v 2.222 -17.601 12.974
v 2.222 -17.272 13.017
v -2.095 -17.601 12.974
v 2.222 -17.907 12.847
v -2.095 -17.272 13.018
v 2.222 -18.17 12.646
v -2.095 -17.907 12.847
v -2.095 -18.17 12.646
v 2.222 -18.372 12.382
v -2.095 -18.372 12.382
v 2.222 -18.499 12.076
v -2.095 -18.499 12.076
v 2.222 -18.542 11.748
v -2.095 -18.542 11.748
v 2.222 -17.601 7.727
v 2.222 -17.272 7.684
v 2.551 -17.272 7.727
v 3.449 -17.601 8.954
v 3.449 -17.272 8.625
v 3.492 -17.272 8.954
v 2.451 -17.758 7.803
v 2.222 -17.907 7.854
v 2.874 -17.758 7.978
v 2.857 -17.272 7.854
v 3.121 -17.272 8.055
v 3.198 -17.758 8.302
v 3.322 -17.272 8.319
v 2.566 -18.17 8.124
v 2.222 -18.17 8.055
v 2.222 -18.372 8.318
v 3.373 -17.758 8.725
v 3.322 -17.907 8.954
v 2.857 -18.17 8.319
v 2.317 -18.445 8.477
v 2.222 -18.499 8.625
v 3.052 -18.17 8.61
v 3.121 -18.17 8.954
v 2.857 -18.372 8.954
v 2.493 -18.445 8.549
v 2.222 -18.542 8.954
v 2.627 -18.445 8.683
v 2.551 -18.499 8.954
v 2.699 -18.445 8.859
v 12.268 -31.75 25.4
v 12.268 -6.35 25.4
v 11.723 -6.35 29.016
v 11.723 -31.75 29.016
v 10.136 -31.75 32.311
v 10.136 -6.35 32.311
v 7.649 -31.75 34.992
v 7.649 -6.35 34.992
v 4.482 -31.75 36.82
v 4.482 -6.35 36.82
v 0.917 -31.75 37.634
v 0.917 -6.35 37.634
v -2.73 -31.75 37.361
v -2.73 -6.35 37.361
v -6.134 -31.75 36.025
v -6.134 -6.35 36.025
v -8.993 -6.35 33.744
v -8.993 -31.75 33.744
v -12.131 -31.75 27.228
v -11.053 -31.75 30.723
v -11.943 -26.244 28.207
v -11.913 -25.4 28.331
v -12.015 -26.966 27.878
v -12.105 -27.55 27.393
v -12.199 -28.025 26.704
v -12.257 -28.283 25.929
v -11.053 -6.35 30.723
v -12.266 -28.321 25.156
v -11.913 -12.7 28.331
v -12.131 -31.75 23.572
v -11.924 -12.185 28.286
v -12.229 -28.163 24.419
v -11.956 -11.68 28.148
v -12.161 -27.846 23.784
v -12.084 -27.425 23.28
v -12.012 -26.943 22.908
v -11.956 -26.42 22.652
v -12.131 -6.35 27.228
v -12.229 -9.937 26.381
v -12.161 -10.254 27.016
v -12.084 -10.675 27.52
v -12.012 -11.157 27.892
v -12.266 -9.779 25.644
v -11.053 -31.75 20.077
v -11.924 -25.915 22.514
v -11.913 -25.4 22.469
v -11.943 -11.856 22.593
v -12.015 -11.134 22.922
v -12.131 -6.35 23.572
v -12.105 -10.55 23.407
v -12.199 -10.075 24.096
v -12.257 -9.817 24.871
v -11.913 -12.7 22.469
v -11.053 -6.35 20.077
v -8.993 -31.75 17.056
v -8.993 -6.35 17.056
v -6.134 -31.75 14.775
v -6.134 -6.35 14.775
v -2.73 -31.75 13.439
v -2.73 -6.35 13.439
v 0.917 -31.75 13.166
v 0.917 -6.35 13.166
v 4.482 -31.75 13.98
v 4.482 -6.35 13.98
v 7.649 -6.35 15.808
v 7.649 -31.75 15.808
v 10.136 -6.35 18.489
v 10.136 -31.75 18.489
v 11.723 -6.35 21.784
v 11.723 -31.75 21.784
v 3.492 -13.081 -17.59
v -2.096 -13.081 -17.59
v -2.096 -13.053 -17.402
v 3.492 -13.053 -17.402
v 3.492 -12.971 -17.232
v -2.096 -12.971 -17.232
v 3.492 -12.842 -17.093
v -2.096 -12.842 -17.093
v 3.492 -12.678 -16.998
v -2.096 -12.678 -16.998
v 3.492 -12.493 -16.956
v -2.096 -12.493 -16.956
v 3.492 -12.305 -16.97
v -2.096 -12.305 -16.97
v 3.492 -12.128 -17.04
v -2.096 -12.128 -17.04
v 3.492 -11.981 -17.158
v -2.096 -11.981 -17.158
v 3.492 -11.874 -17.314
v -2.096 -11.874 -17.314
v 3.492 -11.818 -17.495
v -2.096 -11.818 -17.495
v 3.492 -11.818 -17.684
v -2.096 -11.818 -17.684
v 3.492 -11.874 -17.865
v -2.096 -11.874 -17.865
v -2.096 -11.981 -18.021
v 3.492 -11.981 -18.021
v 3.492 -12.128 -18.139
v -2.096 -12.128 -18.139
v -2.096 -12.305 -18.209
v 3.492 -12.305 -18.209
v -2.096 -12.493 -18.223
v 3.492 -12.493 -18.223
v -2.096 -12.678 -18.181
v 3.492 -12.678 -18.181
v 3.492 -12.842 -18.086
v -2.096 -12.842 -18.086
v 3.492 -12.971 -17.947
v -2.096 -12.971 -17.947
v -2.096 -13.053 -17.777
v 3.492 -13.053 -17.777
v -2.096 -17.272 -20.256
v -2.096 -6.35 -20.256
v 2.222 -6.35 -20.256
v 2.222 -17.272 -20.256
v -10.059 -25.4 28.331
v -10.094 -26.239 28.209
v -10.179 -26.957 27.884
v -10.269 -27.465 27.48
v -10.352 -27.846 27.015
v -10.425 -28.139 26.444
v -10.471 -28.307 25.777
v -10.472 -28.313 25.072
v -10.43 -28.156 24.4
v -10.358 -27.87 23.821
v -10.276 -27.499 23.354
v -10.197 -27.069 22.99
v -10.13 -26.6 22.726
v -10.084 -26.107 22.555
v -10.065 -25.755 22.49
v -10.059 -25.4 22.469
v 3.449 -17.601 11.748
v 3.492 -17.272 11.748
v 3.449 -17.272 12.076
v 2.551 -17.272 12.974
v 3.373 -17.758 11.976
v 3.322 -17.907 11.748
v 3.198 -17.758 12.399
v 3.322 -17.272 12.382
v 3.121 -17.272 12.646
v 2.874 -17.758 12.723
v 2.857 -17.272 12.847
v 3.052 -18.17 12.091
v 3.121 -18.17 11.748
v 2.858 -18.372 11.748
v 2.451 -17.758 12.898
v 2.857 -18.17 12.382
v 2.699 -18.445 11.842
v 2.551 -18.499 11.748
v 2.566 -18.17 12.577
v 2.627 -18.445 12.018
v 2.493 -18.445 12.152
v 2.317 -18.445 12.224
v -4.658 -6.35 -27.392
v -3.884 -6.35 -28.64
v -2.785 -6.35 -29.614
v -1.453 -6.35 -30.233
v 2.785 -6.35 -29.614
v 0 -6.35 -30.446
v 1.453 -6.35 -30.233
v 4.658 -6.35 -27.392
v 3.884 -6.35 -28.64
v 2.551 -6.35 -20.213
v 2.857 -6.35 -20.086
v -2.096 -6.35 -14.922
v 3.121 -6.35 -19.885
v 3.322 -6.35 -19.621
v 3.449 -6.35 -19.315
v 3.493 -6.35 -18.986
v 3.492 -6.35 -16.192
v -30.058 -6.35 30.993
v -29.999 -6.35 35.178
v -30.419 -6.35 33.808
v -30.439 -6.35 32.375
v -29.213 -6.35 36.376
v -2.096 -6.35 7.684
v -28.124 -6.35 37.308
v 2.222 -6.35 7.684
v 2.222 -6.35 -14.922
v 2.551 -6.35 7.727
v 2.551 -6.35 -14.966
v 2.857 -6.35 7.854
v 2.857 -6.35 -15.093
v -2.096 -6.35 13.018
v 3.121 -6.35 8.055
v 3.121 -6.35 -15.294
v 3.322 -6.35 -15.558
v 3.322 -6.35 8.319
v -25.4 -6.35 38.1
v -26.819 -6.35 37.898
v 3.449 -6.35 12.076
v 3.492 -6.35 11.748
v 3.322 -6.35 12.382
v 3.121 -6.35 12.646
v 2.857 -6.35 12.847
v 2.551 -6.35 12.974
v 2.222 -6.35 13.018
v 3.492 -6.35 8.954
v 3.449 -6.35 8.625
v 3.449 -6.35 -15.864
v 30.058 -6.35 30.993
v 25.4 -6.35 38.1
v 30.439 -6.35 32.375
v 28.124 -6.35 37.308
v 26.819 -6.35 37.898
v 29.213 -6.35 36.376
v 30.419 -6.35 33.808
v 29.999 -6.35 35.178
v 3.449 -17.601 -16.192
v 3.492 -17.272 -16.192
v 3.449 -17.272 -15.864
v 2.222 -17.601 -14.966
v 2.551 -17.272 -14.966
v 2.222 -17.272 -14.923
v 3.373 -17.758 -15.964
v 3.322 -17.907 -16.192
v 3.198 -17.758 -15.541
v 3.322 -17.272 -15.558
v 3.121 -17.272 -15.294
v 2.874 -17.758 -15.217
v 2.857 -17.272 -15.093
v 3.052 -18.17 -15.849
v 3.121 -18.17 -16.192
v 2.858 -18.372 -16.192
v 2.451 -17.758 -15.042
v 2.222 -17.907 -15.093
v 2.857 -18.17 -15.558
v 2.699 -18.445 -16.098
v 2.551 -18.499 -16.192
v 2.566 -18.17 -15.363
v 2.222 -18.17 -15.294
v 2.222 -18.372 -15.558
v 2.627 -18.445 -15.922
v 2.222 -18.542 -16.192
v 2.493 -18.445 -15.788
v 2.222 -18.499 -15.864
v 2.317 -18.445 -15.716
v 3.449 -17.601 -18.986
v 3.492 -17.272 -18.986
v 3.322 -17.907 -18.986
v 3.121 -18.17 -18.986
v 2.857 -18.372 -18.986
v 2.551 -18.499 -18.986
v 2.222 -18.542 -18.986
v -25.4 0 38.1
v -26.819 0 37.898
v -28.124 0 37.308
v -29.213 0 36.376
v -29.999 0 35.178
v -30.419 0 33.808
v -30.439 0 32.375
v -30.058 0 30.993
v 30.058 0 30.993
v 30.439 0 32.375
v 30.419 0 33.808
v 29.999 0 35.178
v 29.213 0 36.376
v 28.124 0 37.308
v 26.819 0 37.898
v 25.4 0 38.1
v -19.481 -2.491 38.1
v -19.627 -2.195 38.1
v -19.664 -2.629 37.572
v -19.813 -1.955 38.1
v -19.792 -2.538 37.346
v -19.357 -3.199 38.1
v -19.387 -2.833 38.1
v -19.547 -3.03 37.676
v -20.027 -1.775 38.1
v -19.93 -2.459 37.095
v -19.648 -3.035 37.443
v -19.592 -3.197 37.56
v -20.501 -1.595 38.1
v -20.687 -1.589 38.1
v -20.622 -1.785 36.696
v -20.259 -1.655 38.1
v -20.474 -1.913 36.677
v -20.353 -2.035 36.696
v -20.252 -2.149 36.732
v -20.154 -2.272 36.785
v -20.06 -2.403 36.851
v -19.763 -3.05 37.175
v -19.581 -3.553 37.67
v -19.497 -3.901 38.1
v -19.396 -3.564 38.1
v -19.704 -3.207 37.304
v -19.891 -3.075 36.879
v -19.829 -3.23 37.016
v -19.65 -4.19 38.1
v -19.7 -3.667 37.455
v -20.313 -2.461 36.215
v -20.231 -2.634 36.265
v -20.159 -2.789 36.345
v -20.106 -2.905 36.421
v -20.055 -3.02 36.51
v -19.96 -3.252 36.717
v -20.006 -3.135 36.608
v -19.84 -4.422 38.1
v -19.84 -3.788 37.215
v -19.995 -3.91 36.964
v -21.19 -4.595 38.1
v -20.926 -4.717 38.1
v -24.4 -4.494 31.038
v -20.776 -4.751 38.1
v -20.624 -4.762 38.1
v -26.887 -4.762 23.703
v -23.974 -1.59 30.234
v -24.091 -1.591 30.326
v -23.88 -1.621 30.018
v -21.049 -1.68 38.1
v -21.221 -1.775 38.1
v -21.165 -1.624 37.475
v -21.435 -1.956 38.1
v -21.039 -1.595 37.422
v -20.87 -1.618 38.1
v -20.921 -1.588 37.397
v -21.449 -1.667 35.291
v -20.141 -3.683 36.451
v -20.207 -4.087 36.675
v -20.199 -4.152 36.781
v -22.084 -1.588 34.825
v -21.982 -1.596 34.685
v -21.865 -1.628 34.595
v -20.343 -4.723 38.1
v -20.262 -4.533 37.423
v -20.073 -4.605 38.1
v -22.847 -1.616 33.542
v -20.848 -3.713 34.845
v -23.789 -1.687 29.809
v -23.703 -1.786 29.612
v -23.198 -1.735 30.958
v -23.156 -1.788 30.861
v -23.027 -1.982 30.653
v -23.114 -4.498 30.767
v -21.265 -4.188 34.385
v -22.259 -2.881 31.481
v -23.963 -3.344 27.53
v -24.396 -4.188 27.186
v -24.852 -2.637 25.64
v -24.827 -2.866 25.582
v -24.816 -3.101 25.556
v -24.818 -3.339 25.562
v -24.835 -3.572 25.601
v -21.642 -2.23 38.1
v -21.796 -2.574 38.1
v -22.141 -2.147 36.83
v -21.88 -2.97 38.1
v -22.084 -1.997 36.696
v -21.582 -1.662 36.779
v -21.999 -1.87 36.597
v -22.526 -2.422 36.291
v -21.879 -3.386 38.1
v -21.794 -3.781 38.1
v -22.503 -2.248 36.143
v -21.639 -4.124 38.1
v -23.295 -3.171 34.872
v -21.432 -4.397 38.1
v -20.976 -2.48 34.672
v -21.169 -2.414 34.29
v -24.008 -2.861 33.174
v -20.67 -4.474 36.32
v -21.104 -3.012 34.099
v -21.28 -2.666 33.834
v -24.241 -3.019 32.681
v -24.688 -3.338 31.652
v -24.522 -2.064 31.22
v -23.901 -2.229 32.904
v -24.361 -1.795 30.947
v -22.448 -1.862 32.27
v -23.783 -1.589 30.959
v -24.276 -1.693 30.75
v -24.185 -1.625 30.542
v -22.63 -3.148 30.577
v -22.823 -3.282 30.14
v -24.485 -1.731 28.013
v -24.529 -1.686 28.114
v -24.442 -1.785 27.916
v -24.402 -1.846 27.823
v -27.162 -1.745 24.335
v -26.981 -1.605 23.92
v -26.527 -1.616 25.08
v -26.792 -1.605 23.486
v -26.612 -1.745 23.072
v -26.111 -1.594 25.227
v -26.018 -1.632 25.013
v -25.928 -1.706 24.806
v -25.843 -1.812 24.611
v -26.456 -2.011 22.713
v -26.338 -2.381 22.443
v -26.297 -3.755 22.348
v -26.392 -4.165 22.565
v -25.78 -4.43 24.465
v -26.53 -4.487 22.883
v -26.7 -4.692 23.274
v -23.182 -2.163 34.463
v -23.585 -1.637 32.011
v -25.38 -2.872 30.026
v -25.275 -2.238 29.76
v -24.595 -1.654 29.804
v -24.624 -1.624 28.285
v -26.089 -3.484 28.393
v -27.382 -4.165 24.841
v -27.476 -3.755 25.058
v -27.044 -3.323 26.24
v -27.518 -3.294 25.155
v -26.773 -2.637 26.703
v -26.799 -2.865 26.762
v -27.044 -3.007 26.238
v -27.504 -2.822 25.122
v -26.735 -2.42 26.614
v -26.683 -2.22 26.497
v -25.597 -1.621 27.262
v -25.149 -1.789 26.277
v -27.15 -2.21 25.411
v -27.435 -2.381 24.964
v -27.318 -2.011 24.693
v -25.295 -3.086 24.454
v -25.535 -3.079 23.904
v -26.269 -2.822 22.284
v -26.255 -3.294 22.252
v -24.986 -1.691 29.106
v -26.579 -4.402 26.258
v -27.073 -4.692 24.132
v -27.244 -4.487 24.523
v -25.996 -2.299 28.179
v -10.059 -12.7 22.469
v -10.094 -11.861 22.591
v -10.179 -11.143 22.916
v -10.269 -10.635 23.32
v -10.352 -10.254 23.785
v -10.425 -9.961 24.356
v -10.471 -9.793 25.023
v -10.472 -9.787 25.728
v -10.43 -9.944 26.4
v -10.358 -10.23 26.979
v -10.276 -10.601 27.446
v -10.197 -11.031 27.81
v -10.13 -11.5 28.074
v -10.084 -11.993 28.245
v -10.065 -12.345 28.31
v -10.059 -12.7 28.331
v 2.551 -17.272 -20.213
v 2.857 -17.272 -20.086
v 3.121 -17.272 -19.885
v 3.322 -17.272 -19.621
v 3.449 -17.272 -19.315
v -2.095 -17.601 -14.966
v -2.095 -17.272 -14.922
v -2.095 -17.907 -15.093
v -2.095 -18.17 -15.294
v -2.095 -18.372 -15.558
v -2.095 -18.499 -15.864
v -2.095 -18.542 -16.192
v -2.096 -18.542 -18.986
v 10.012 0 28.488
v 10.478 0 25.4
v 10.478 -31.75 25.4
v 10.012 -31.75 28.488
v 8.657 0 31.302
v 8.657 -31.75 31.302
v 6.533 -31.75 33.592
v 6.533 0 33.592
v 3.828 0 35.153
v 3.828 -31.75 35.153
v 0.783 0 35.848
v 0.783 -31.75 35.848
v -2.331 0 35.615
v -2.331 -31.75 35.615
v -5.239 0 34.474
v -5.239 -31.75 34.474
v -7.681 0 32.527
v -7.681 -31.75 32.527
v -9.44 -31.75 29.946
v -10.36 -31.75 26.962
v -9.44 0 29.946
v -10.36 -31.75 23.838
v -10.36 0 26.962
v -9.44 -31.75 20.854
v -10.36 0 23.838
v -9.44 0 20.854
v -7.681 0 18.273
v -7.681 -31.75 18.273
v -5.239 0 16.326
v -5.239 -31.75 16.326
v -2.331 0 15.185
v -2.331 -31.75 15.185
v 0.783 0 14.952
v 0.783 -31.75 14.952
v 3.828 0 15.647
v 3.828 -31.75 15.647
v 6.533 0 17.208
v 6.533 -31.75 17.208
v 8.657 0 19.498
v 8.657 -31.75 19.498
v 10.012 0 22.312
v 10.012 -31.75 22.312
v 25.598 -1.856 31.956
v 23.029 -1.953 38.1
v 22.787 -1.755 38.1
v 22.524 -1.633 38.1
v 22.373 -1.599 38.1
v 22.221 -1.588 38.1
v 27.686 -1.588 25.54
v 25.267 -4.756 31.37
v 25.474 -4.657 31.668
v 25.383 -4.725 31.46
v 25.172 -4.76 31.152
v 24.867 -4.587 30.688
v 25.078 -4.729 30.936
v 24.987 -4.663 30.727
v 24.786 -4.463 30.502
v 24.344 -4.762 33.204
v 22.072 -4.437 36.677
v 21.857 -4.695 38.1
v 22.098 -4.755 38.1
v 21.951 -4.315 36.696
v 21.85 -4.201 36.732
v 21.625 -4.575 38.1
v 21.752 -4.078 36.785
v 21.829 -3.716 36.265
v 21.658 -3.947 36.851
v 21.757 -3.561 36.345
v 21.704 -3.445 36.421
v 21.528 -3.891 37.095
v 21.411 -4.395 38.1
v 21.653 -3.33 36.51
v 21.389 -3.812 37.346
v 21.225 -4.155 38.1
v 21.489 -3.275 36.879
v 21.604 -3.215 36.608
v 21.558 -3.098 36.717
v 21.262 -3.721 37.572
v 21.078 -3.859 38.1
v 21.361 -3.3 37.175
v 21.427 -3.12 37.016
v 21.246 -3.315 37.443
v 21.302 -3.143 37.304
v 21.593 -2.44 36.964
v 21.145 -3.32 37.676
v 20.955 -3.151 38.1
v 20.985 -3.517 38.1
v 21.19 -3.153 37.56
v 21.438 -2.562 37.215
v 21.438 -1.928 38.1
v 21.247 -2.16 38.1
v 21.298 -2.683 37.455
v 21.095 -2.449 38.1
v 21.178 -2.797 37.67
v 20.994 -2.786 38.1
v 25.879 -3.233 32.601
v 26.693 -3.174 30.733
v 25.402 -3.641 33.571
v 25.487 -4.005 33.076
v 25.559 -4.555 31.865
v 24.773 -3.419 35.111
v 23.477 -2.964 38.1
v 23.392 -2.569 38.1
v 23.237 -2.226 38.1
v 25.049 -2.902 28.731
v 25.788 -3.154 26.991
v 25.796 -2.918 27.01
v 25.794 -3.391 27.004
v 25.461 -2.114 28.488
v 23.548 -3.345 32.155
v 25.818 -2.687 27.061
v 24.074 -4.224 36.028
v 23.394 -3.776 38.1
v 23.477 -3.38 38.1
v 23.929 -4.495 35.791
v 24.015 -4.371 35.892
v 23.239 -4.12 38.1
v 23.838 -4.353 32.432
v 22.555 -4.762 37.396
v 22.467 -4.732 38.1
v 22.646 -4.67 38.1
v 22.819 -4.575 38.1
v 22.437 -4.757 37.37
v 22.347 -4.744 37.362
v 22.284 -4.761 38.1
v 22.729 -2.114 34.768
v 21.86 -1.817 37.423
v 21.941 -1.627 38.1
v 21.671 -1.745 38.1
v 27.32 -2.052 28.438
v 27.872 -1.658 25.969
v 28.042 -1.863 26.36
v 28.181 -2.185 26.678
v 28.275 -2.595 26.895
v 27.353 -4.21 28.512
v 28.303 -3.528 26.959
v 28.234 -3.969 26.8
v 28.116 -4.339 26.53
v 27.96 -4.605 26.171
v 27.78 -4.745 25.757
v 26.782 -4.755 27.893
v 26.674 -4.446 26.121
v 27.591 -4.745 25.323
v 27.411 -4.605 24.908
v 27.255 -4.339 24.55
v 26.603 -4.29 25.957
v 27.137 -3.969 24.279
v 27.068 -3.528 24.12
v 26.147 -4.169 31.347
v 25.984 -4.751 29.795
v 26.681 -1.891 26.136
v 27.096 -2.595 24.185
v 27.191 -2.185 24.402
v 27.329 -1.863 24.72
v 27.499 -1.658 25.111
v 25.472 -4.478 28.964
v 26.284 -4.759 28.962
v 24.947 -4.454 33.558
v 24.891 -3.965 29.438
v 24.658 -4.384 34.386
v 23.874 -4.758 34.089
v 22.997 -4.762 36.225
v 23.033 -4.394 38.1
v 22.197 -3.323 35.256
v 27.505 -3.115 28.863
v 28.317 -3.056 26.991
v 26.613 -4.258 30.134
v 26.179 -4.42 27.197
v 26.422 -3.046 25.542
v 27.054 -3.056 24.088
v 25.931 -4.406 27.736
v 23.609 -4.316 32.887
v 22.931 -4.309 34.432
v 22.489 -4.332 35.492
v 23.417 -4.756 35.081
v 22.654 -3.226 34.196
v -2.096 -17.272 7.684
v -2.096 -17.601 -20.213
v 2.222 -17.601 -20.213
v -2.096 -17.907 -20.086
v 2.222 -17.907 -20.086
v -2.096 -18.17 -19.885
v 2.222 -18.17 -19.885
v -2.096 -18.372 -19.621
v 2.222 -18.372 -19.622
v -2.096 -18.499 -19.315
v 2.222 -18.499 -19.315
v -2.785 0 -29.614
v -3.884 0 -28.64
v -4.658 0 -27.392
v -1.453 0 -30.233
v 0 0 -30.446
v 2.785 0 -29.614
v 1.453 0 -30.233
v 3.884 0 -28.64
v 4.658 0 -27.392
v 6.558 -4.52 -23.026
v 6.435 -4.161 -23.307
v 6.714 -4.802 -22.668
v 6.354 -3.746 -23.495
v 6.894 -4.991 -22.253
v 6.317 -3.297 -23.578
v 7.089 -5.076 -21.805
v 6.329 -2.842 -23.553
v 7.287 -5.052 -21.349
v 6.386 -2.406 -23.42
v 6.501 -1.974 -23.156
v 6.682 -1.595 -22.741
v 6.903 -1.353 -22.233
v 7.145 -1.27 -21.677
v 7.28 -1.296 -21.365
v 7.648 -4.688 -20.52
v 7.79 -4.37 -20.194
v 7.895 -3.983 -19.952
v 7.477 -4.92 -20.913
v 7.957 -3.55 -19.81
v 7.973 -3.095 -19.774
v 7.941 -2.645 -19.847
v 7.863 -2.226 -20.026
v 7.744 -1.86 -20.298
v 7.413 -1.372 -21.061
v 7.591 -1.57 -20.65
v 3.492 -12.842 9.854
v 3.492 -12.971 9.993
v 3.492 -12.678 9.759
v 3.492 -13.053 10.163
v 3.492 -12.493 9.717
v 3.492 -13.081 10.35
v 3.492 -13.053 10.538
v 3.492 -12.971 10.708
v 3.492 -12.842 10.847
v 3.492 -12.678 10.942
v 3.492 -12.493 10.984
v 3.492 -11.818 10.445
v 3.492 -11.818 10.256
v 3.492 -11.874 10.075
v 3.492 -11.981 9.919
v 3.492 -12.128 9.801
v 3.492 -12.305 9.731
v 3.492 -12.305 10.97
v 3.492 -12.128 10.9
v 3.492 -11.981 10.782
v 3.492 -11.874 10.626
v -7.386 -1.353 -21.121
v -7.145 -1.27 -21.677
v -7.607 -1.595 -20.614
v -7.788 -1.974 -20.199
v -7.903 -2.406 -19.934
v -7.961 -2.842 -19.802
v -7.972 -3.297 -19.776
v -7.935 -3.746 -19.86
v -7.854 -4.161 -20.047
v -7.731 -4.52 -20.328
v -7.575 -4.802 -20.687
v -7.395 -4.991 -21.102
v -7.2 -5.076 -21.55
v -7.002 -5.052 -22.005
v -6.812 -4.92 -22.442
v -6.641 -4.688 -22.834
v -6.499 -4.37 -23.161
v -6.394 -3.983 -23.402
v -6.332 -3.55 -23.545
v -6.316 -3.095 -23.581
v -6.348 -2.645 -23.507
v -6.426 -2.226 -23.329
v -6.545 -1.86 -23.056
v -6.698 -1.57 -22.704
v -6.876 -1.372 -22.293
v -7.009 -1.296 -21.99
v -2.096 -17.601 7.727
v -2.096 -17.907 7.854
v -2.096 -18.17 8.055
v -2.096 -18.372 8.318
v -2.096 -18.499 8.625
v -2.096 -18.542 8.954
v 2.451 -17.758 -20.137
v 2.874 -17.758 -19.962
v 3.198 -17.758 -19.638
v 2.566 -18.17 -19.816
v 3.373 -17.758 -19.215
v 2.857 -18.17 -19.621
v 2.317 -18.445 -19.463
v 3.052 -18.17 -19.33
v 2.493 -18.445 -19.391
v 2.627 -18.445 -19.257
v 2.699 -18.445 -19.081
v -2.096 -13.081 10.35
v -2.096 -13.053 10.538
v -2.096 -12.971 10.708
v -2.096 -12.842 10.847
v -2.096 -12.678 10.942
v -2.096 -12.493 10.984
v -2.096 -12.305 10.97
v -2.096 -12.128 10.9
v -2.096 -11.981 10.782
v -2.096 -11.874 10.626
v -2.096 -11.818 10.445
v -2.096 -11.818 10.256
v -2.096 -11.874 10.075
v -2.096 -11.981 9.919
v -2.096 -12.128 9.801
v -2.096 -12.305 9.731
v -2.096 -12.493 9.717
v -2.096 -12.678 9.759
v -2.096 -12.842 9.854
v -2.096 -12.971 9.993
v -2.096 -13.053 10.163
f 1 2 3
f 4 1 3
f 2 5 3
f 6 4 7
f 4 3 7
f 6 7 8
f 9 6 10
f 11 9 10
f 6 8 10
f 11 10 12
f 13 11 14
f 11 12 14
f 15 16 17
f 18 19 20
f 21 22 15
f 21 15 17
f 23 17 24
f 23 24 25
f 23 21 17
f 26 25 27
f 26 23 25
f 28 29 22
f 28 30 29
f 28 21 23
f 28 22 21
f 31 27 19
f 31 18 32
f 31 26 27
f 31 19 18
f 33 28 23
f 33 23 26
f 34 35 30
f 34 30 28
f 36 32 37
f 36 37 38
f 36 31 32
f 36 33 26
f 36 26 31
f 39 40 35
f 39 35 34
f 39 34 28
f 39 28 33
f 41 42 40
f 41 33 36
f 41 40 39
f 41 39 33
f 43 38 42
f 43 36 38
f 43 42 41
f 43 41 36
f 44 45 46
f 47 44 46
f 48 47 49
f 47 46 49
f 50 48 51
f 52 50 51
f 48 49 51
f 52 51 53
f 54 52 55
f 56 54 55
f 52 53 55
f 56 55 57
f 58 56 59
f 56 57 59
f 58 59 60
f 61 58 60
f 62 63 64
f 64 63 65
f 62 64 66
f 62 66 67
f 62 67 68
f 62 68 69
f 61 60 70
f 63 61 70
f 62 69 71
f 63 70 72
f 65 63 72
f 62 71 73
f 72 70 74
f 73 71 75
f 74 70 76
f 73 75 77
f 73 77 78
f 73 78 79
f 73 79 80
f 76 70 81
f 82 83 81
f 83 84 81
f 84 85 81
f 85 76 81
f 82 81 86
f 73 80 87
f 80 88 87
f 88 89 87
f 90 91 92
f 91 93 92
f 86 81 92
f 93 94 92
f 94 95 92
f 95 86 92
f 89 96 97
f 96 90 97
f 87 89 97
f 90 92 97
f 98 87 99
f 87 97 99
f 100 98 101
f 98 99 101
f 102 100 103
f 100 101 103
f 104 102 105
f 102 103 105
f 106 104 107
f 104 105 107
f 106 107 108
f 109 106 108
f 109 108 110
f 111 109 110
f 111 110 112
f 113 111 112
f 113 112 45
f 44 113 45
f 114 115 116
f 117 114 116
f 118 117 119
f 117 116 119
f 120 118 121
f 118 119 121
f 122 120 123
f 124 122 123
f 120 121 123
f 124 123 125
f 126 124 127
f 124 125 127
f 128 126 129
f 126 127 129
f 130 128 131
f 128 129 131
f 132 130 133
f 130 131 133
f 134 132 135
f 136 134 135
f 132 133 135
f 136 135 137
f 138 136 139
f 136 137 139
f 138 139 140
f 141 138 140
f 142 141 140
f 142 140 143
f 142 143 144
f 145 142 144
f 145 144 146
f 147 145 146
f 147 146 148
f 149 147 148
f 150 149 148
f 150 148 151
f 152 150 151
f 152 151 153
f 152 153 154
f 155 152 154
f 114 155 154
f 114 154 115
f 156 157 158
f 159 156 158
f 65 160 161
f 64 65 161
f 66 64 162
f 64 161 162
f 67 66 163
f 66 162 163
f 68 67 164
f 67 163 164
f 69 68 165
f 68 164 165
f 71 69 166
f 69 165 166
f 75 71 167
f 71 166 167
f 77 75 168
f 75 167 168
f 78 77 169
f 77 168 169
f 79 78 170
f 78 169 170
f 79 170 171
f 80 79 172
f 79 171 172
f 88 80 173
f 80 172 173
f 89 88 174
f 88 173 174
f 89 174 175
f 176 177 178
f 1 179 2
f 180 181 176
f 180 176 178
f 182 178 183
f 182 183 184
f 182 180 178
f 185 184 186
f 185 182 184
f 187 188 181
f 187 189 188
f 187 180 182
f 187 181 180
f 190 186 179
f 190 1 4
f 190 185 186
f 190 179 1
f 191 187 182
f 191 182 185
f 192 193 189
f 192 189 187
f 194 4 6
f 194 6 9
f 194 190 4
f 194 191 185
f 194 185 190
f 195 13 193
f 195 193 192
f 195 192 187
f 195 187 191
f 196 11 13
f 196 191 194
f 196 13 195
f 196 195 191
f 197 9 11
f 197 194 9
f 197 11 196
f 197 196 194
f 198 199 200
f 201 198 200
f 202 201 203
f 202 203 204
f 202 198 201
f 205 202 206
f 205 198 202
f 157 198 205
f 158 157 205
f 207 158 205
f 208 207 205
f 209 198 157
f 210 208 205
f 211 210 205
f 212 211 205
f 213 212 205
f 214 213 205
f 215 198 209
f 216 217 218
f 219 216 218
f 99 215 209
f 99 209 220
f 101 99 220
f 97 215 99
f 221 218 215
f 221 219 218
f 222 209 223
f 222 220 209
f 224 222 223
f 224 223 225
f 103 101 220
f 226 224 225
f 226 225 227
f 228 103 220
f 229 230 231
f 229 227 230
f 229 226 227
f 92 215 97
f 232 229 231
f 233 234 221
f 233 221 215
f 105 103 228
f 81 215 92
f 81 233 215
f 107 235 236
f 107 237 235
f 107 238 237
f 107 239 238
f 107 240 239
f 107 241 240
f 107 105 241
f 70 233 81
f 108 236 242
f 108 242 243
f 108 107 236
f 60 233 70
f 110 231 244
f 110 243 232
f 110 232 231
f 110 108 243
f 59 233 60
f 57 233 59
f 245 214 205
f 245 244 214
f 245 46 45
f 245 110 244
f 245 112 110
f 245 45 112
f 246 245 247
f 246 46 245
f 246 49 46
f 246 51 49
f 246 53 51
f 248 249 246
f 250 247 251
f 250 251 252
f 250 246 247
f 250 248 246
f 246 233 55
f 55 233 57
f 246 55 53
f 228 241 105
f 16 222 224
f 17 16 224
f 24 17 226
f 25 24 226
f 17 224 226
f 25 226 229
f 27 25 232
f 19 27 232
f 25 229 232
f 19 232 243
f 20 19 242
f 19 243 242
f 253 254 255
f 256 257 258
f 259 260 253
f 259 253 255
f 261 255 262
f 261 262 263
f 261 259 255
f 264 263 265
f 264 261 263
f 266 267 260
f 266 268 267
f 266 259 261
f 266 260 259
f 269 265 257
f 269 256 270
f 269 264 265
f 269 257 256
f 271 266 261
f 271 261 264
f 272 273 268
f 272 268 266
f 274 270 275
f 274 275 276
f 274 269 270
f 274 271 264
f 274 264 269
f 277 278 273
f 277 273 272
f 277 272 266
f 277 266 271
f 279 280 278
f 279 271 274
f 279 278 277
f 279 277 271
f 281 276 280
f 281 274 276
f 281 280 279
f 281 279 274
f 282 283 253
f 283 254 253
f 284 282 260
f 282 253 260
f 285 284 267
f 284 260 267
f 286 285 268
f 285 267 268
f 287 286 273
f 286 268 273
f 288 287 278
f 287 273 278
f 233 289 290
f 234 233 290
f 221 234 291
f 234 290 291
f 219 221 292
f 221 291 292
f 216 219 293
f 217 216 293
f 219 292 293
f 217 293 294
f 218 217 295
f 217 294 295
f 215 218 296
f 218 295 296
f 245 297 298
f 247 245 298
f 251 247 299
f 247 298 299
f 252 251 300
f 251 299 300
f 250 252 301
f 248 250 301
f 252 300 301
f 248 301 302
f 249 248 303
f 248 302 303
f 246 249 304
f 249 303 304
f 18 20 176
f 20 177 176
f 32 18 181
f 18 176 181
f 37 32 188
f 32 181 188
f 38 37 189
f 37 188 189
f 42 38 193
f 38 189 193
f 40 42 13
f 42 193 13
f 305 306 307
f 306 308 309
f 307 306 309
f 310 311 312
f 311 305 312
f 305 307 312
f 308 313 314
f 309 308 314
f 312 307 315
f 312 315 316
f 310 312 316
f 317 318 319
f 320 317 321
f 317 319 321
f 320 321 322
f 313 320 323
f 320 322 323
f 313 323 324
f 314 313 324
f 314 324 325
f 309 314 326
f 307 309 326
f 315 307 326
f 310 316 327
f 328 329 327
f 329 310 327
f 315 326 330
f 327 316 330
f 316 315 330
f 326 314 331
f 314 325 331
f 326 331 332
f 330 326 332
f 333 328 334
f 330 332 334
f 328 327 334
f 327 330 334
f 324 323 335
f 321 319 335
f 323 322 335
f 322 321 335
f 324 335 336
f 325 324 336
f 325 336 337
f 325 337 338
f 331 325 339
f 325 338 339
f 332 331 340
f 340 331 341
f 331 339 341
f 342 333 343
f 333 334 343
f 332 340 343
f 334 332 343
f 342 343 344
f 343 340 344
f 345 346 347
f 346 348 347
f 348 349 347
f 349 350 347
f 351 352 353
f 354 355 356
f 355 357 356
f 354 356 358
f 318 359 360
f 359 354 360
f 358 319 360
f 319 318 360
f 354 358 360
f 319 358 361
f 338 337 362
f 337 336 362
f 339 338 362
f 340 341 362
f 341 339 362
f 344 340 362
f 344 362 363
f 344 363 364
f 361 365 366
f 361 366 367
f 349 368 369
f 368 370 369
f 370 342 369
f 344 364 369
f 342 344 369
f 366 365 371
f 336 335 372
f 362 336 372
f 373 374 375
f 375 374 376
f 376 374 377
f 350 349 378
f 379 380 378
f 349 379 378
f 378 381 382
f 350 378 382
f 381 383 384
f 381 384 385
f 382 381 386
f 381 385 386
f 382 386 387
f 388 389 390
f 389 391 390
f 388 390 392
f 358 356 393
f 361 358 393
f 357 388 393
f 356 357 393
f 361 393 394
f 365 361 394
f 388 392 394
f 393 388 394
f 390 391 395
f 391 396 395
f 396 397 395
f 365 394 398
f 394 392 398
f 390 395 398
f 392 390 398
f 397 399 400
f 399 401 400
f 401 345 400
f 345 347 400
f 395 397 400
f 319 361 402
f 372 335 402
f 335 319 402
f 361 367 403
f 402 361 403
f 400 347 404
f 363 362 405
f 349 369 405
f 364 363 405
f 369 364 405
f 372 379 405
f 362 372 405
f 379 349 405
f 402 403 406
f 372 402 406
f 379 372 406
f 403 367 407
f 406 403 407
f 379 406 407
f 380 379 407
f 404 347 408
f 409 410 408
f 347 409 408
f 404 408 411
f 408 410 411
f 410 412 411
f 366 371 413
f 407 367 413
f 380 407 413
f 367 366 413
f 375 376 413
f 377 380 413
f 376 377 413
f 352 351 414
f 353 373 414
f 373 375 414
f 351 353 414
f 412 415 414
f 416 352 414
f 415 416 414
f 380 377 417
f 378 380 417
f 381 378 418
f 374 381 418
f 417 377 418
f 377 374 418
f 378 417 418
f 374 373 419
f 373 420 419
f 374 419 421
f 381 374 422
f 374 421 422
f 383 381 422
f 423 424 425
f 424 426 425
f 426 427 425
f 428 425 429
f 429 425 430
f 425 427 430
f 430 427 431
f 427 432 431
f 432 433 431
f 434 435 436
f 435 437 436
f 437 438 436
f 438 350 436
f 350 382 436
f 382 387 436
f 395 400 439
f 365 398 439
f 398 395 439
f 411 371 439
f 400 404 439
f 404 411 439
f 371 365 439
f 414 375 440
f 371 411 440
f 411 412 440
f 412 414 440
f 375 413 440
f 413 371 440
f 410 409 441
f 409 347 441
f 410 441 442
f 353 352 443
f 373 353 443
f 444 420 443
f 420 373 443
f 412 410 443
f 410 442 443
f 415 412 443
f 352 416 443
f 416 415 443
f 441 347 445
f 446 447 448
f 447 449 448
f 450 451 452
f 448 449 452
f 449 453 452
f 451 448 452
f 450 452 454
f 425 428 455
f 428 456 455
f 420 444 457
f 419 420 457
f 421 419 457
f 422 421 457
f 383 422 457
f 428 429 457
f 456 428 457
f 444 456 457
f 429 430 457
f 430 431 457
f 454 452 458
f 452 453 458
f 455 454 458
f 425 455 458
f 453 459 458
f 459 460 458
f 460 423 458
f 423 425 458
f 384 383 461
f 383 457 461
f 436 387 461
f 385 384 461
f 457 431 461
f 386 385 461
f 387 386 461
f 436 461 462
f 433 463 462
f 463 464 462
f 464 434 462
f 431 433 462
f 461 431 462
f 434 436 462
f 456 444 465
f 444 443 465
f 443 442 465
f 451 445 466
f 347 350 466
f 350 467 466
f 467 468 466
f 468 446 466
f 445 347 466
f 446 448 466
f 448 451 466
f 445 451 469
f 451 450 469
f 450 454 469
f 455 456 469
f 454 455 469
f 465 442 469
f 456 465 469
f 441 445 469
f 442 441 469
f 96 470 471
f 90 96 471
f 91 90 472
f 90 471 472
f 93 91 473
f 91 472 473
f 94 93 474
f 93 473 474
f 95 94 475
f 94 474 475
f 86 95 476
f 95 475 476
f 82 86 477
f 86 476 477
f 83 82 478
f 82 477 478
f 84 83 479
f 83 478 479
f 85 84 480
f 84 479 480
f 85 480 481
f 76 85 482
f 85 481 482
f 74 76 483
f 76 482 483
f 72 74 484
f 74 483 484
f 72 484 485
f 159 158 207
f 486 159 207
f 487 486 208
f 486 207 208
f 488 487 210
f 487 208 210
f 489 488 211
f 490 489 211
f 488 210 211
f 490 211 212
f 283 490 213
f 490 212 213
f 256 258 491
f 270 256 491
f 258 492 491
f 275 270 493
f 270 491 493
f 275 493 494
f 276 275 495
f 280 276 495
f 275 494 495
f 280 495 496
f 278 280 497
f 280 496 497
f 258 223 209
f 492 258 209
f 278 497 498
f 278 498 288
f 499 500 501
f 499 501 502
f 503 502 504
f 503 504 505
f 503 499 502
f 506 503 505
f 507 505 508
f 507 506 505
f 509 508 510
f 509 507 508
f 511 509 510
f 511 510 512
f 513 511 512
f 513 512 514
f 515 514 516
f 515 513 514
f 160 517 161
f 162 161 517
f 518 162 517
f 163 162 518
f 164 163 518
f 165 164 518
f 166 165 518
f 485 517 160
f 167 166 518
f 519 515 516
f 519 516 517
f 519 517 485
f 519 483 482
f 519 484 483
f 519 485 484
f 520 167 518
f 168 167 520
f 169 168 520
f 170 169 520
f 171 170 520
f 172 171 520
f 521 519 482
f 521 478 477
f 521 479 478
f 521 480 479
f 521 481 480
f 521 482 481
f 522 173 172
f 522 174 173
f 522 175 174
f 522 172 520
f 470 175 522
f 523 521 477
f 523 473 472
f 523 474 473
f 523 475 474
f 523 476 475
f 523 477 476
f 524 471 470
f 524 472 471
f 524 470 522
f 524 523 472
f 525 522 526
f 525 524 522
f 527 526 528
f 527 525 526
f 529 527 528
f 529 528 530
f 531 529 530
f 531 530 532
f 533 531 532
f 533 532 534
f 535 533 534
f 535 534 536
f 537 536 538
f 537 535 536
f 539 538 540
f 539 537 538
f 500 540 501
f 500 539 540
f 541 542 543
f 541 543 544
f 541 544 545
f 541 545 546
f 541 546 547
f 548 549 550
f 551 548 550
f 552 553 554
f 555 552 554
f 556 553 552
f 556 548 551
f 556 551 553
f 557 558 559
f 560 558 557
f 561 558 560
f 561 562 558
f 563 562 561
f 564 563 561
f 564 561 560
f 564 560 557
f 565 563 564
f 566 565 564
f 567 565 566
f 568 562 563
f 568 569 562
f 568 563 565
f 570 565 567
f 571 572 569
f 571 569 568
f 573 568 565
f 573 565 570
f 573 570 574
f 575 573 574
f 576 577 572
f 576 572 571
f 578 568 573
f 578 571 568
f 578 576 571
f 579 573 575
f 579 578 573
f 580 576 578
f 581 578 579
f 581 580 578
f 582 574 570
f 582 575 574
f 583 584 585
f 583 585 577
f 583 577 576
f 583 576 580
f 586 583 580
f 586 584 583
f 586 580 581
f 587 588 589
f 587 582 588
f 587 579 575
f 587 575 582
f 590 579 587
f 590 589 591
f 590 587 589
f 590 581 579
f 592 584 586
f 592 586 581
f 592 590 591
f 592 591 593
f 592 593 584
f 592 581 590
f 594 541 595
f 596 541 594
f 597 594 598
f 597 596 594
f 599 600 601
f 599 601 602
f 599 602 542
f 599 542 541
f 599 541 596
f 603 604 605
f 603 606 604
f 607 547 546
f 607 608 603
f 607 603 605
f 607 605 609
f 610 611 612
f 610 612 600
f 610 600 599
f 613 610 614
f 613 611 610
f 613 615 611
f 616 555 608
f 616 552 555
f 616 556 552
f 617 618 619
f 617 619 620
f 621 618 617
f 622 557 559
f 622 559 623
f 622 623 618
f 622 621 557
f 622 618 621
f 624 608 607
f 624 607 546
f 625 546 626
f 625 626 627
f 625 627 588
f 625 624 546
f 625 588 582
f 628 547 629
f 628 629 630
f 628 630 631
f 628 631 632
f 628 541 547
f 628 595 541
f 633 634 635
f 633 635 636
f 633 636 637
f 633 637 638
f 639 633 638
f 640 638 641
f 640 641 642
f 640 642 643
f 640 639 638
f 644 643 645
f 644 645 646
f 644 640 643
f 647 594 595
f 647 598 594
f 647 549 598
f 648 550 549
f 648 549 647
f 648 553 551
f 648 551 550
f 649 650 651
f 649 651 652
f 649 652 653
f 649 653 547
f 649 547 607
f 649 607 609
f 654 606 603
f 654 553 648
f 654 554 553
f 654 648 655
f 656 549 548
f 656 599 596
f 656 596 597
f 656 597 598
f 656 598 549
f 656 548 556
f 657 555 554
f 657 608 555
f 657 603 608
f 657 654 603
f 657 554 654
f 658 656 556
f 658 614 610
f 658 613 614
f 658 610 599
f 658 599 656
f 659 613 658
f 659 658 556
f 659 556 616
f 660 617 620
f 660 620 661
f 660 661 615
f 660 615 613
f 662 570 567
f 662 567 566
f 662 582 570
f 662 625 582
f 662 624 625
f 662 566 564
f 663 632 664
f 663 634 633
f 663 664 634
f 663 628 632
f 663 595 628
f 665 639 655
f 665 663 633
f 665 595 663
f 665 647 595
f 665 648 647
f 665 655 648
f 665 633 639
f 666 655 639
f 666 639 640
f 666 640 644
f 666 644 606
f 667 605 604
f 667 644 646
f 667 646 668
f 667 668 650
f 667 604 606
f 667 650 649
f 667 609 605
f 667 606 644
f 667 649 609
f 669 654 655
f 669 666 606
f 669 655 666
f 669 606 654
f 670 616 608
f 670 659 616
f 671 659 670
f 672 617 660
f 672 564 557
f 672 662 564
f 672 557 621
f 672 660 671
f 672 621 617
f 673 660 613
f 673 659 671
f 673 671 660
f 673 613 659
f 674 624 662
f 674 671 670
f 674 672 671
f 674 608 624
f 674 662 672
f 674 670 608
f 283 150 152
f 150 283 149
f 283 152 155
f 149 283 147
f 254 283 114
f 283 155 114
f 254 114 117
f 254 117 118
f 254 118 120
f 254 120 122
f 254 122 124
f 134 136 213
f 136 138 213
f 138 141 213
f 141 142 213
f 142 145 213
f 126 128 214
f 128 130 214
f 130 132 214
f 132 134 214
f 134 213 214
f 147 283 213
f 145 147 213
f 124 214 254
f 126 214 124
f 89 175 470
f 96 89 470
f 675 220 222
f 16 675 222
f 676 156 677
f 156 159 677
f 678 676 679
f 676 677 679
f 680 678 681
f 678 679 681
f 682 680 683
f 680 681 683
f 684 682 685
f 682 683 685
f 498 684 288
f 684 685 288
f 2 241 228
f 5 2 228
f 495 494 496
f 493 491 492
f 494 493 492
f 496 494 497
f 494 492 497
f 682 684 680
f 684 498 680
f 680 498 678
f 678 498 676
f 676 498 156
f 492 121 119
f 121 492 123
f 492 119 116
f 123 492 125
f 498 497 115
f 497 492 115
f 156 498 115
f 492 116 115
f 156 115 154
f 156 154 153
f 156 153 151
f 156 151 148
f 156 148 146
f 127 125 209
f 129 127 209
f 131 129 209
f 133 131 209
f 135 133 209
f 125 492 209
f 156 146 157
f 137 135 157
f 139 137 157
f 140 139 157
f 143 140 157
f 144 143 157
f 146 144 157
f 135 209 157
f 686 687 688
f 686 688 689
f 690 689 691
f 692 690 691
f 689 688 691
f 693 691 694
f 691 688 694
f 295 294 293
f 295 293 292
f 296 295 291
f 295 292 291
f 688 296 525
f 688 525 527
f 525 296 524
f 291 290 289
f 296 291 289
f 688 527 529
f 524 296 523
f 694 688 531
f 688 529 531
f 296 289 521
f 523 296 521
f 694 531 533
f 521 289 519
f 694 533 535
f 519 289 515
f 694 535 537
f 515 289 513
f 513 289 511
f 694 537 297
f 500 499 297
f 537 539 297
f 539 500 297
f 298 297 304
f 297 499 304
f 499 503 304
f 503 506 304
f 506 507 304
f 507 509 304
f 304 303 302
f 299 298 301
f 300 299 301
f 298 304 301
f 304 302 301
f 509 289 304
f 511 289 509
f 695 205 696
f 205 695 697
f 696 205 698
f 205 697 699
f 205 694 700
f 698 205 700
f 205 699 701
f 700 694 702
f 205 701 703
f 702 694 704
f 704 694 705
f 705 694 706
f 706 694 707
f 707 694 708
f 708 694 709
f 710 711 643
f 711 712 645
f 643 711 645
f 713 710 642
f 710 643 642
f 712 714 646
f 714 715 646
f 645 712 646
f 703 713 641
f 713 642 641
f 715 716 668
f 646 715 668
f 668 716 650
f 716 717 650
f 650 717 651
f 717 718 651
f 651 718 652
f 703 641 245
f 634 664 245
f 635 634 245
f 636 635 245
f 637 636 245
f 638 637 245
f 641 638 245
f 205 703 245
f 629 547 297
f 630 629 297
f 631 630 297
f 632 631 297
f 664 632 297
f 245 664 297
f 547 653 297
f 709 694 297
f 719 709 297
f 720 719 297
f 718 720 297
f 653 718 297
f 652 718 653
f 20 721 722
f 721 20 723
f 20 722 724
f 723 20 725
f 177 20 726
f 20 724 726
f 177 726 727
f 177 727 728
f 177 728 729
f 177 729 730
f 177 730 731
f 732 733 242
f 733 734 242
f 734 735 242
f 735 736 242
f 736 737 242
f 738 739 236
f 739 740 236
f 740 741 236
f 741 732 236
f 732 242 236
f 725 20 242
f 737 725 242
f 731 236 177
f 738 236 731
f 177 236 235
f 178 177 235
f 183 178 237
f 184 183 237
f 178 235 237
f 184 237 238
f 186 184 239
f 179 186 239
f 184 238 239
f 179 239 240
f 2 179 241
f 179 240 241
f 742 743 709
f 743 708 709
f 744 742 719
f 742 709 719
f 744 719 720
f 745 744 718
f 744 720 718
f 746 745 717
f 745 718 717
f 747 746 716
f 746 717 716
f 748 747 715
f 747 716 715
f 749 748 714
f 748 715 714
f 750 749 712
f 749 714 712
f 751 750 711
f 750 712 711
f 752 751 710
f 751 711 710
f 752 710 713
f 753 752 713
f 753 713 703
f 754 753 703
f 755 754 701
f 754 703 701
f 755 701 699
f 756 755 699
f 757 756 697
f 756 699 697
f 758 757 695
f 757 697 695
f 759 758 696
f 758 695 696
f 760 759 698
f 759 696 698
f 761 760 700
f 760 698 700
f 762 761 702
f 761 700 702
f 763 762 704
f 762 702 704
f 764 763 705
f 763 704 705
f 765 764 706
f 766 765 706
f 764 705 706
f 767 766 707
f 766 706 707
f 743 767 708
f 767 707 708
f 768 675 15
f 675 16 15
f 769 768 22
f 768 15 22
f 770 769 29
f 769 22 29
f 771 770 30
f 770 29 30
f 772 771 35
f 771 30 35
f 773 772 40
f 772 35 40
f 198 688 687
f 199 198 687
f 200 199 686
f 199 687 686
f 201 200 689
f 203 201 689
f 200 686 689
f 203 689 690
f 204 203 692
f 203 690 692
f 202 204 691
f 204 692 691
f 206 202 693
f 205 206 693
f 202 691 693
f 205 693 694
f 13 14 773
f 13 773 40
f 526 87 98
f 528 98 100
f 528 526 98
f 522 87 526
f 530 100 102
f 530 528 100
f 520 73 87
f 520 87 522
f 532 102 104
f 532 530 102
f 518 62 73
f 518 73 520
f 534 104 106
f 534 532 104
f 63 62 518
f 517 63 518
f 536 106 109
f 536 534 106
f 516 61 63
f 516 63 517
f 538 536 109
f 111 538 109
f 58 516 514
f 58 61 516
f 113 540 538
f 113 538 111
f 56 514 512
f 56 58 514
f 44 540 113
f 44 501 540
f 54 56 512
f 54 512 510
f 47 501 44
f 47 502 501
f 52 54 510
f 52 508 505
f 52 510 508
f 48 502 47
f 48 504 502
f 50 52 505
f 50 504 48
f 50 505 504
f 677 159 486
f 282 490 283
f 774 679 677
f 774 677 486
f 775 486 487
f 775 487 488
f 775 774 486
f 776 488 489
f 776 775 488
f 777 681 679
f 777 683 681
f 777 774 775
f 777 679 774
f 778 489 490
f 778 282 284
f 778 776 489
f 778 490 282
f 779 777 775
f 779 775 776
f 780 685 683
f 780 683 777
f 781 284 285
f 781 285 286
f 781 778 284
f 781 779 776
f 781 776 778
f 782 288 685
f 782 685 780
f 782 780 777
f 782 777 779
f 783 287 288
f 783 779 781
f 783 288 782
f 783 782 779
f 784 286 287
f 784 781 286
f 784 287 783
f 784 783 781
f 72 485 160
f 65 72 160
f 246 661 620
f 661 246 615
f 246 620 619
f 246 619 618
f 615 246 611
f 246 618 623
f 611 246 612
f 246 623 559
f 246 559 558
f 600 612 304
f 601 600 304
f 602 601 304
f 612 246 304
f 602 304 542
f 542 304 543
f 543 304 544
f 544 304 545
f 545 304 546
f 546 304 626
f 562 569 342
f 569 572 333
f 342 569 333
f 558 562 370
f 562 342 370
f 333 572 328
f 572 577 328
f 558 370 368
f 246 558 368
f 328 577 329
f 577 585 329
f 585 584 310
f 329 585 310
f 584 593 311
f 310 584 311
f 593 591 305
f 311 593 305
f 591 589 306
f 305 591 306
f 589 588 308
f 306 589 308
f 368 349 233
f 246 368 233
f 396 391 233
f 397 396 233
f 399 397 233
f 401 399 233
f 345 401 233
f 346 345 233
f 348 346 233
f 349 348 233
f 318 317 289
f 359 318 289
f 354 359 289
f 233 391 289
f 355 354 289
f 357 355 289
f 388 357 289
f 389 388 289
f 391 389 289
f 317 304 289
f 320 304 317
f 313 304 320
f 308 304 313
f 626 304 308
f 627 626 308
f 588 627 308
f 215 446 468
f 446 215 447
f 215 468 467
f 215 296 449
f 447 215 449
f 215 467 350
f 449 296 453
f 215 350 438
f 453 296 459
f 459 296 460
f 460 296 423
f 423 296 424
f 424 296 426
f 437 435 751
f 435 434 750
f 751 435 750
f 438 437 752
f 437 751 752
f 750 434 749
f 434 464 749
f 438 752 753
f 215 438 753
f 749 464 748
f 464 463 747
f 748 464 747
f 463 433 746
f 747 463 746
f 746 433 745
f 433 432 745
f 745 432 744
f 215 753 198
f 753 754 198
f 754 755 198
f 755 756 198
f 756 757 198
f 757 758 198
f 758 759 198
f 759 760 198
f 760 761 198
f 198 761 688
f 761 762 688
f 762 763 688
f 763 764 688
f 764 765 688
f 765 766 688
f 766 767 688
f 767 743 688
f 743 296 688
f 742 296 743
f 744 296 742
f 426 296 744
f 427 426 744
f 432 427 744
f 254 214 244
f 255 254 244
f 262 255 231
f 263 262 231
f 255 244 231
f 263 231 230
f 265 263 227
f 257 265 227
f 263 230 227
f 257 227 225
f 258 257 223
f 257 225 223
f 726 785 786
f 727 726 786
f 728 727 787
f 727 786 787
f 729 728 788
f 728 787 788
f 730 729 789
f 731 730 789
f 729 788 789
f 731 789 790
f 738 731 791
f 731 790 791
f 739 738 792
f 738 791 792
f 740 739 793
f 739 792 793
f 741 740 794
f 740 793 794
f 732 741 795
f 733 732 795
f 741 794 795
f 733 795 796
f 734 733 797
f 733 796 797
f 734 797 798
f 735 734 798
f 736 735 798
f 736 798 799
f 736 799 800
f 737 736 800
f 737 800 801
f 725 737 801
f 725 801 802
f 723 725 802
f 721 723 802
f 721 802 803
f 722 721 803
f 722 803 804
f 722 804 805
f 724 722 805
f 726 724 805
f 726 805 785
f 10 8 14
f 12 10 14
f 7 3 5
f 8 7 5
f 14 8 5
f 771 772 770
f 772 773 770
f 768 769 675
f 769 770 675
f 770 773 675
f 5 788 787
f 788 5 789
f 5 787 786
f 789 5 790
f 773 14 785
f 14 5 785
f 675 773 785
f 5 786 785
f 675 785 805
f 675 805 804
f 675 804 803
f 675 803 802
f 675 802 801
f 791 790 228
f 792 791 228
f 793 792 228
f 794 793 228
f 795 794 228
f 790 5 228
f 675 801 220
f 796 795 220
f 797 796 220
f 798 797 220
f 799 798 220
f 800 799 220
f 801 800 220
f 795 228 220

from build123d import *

# Parameters (mm, degrees)
F0_R      = 10.4775
F1_DEPTH  = 6.35
F2_R      = 1.905
F3_DEPTH  = 9.0678
F5_DEPTH  = 12.192
F6_R      = 0.635
F7_R      = 0.635
F8_DEPTH  = 32.5765
F9_R      = 1.27
F10_R     = 12.2682
F10_R_2   = 10.4775
F11_DEPTH = 25.4
F13_DEPTH = 12.7
F14_R     = 1.5875
F16_R     = 1.5875


with BuildPart() as f1:
    # F0 (on Front) → F1 (new body)
    with BuildSketch(Plane.XZ):
        with BuildLine():
            ThreePointArc((-4.6582808724, -27.3922420853), (0, -30.4457132023), (4.6582808724, -27.3922420853))
            Line((4.6582808724, -27.3922420853), (30.0582808724, 30.993471117))
            ThreePointArc((30.0582808724, 30.993471117), (29.6485978114, 35.8049266843), (25.4, 38.1))
            Line((25.4, 38.1), (0, 38.1))
            Line((0, 38.1), (-25.4, 38.1))
            ThreePointArc((-25.4, 38.1), (-29.6485978114, 35.8049266843), (-30.0582808724, 30.993471117))
            Line((-30.0582808724, 30.993471117), (-4.6582808724, -27.3922420853))
        make_face()
        with Locations((0, 25.4)):
            Circle(F0_R, mode=Mode.SUBTRACT)
    extrude(amount=F1_DEPTH)

    # F2 (on Right) → F3 (cut, symmetric)
    with BuildSketch(Plane.YZ):
        with Locations((-3.175, -21.6772420853)):
            Circle(F2_R)
    extrude(amount=F3_DEPTH, both=True, mode=Mode.SUBTRACT)

    # F4 (on face) → F5 (join)
    with BuildSketch(Plane.XZ.offset(6.35)):
        with BuildLine():
            Line((2.2225, 13.0175), (-2.0955, 13.0175))
            Line((-2.0955, 13.0175), (-2.0955, 7.6835))
            Line((-2.0955, 7.6835), (2.2225, 7.6835))
            ThreePointArc((2.2225, 7.6835), (3.1205256121, 8.0554743879), (3.4925, 8.9535))
            Line((3.4925, 8.9535), (3.4925, 11.7475))
            ThreePointArc((3.4925, 11.7475), (3.1205256121, 12.6455256121), (2.2225, 13.0175))
        make_face()
        with BuildLine():
            Line((2.2225, -14.9225), (-2.0955, -14.9225))
            Line((-2.0955, -14.9225), (-2.0955, -20.2565))
            Line((-2.0955, -20.2565), (2.2225, -20.2565))
            ThreePointArc((2.2225, -20.2565), (3.1205256121, -19.8845256121), (3.4925, -18.9865))
            Line((3.4925, -18.9865), (3.4925, -16.1925))
            ThreePointArc((3.4925, -16.1925), (3.1205256121, -15.2944743879), (2.2225, -14.9225))
        make_face()
    extrude(amount=F5_DEPTH)

    # F6 (on face) + F7 (on face) → F8 (cut, through all)
    with BuildSketch(Plane(origin=(-2.0955, 0, 0), x_dir=(0, -1, 0), z_dir=(-1, 0, 0))):
        with Locations((12.446, -17.5895)):
            Circle(F6_R)
    with BuildSketch(Plane(origin=(-2.0955, 0, 0), x_dir=(0, -1, 0), z_dir=(-1, 0, 0))):
        with Locations((12.446, 10.3505)):
            Circle(F7_R)
    extrude(amount=-F8_DEPTH, mode=Mode.SUBTRACT)

    # F9
    f9_edges = [f1.edges().sort_by_distance(p)[0] for p in [
        (0.0635, -18.542, 13.0175),
        (3.120526, -18.542, 12.645526),
        (3.4925, -18.542, 10.3505),
        (3.120526, -18.542, 8.055474),
        (0.0635, -18.542, 7.6835),
        (0.0635, -18.542, -20.2565),
        (3.4925, -18.542, -17.5895),
        (3.120526, -18.542, -15.294474),
        (0.0635, -18.542, -14.9225),
    ]]
    fillet(f9_edges, radius=F9_R)

    # F10 (on face) → F11 (join)
    with BuildSketch(Plane.XZ.offset(6.35)):
        with Locations((0, 25.4)):
            Circle(F10_R)
        with Locations((0, 25.4)):
            Circle(F10_R_2, mode=Mode.SUBTRACT)
    extrude(amount=F11_DEPTH)

    # F12 (on Right) → F13 (cut)
    with BuildSketch(Plane.YZ):
        with BuildLine():
            Line((-25.4, 22.4685867739), (-12.7, 22.4685867739))
            ThreePointArc((-12.7, 22.4685867739), (-9.7685867739, 25.4), (-12.7, 28.3314132261))
            Line((-12.7, 28.3314132261), (-25.4, 28.3314132261))
            ThreePointArc((-25.4, 28.3314132261), (-28.3314132261, 25.4), (-25.4, 22.4685867739))
        make_face()
    extrude(amount=-F13_DEPTH, mode=Mode.SUBTRACT)

    # F15: sweep along a path in F15_path
    with BuildLine(Plane(origin=(30.0582808724, -6.35, 30.993471117), x_dir=(0.3989230085, 0, 0.9169844237), z_dir=(0.9169844237, 0, -0.3989230085))) as f15_path:
        Line((0, 0), (-63.6714339884, 0))
    # F14 (on face) → F15 (sweep, cut)
    with BuildSketch(Plane(origin=(-13.9372156493, 0, -6.0632174906), x_dir=(0, -1, 0), z_dir=(-0.9169844237, 0, -0.3989230085))):
        with Locations((3.175, 32.4612700858)):
            Circle(F14_R)
    sweep(path=f15_path.line, mode=Mode.SUBTRACT)

    # F17: sweep along a path in F17_path
    with BuildLine(Plane(origin=(-4.6582808724, -6.35, -27.3922420853), x_dir=(0.3989230085, 0, -0.9169844237), z_dir=(-0.9169844237, 0, -0.3989230085))) as f17_path:
        Line((0, 0), (-63.6714339884, 0))
    # F16 (on face) → F17 (sweep, cut)
    with BuildSketch(Plane(origin=(13.9372156493, 0, -6.0632174906), x_dir=(0, 1, 0), z_dir=(0.9169844237, 0, -0.3989230085))):
        with Locations((-3.175, 34.4638973475)):
            Circle(F16_R)
    sweep(path=f17_path.line, mode=Mode.SUBTRACT)


solid = f1.part
